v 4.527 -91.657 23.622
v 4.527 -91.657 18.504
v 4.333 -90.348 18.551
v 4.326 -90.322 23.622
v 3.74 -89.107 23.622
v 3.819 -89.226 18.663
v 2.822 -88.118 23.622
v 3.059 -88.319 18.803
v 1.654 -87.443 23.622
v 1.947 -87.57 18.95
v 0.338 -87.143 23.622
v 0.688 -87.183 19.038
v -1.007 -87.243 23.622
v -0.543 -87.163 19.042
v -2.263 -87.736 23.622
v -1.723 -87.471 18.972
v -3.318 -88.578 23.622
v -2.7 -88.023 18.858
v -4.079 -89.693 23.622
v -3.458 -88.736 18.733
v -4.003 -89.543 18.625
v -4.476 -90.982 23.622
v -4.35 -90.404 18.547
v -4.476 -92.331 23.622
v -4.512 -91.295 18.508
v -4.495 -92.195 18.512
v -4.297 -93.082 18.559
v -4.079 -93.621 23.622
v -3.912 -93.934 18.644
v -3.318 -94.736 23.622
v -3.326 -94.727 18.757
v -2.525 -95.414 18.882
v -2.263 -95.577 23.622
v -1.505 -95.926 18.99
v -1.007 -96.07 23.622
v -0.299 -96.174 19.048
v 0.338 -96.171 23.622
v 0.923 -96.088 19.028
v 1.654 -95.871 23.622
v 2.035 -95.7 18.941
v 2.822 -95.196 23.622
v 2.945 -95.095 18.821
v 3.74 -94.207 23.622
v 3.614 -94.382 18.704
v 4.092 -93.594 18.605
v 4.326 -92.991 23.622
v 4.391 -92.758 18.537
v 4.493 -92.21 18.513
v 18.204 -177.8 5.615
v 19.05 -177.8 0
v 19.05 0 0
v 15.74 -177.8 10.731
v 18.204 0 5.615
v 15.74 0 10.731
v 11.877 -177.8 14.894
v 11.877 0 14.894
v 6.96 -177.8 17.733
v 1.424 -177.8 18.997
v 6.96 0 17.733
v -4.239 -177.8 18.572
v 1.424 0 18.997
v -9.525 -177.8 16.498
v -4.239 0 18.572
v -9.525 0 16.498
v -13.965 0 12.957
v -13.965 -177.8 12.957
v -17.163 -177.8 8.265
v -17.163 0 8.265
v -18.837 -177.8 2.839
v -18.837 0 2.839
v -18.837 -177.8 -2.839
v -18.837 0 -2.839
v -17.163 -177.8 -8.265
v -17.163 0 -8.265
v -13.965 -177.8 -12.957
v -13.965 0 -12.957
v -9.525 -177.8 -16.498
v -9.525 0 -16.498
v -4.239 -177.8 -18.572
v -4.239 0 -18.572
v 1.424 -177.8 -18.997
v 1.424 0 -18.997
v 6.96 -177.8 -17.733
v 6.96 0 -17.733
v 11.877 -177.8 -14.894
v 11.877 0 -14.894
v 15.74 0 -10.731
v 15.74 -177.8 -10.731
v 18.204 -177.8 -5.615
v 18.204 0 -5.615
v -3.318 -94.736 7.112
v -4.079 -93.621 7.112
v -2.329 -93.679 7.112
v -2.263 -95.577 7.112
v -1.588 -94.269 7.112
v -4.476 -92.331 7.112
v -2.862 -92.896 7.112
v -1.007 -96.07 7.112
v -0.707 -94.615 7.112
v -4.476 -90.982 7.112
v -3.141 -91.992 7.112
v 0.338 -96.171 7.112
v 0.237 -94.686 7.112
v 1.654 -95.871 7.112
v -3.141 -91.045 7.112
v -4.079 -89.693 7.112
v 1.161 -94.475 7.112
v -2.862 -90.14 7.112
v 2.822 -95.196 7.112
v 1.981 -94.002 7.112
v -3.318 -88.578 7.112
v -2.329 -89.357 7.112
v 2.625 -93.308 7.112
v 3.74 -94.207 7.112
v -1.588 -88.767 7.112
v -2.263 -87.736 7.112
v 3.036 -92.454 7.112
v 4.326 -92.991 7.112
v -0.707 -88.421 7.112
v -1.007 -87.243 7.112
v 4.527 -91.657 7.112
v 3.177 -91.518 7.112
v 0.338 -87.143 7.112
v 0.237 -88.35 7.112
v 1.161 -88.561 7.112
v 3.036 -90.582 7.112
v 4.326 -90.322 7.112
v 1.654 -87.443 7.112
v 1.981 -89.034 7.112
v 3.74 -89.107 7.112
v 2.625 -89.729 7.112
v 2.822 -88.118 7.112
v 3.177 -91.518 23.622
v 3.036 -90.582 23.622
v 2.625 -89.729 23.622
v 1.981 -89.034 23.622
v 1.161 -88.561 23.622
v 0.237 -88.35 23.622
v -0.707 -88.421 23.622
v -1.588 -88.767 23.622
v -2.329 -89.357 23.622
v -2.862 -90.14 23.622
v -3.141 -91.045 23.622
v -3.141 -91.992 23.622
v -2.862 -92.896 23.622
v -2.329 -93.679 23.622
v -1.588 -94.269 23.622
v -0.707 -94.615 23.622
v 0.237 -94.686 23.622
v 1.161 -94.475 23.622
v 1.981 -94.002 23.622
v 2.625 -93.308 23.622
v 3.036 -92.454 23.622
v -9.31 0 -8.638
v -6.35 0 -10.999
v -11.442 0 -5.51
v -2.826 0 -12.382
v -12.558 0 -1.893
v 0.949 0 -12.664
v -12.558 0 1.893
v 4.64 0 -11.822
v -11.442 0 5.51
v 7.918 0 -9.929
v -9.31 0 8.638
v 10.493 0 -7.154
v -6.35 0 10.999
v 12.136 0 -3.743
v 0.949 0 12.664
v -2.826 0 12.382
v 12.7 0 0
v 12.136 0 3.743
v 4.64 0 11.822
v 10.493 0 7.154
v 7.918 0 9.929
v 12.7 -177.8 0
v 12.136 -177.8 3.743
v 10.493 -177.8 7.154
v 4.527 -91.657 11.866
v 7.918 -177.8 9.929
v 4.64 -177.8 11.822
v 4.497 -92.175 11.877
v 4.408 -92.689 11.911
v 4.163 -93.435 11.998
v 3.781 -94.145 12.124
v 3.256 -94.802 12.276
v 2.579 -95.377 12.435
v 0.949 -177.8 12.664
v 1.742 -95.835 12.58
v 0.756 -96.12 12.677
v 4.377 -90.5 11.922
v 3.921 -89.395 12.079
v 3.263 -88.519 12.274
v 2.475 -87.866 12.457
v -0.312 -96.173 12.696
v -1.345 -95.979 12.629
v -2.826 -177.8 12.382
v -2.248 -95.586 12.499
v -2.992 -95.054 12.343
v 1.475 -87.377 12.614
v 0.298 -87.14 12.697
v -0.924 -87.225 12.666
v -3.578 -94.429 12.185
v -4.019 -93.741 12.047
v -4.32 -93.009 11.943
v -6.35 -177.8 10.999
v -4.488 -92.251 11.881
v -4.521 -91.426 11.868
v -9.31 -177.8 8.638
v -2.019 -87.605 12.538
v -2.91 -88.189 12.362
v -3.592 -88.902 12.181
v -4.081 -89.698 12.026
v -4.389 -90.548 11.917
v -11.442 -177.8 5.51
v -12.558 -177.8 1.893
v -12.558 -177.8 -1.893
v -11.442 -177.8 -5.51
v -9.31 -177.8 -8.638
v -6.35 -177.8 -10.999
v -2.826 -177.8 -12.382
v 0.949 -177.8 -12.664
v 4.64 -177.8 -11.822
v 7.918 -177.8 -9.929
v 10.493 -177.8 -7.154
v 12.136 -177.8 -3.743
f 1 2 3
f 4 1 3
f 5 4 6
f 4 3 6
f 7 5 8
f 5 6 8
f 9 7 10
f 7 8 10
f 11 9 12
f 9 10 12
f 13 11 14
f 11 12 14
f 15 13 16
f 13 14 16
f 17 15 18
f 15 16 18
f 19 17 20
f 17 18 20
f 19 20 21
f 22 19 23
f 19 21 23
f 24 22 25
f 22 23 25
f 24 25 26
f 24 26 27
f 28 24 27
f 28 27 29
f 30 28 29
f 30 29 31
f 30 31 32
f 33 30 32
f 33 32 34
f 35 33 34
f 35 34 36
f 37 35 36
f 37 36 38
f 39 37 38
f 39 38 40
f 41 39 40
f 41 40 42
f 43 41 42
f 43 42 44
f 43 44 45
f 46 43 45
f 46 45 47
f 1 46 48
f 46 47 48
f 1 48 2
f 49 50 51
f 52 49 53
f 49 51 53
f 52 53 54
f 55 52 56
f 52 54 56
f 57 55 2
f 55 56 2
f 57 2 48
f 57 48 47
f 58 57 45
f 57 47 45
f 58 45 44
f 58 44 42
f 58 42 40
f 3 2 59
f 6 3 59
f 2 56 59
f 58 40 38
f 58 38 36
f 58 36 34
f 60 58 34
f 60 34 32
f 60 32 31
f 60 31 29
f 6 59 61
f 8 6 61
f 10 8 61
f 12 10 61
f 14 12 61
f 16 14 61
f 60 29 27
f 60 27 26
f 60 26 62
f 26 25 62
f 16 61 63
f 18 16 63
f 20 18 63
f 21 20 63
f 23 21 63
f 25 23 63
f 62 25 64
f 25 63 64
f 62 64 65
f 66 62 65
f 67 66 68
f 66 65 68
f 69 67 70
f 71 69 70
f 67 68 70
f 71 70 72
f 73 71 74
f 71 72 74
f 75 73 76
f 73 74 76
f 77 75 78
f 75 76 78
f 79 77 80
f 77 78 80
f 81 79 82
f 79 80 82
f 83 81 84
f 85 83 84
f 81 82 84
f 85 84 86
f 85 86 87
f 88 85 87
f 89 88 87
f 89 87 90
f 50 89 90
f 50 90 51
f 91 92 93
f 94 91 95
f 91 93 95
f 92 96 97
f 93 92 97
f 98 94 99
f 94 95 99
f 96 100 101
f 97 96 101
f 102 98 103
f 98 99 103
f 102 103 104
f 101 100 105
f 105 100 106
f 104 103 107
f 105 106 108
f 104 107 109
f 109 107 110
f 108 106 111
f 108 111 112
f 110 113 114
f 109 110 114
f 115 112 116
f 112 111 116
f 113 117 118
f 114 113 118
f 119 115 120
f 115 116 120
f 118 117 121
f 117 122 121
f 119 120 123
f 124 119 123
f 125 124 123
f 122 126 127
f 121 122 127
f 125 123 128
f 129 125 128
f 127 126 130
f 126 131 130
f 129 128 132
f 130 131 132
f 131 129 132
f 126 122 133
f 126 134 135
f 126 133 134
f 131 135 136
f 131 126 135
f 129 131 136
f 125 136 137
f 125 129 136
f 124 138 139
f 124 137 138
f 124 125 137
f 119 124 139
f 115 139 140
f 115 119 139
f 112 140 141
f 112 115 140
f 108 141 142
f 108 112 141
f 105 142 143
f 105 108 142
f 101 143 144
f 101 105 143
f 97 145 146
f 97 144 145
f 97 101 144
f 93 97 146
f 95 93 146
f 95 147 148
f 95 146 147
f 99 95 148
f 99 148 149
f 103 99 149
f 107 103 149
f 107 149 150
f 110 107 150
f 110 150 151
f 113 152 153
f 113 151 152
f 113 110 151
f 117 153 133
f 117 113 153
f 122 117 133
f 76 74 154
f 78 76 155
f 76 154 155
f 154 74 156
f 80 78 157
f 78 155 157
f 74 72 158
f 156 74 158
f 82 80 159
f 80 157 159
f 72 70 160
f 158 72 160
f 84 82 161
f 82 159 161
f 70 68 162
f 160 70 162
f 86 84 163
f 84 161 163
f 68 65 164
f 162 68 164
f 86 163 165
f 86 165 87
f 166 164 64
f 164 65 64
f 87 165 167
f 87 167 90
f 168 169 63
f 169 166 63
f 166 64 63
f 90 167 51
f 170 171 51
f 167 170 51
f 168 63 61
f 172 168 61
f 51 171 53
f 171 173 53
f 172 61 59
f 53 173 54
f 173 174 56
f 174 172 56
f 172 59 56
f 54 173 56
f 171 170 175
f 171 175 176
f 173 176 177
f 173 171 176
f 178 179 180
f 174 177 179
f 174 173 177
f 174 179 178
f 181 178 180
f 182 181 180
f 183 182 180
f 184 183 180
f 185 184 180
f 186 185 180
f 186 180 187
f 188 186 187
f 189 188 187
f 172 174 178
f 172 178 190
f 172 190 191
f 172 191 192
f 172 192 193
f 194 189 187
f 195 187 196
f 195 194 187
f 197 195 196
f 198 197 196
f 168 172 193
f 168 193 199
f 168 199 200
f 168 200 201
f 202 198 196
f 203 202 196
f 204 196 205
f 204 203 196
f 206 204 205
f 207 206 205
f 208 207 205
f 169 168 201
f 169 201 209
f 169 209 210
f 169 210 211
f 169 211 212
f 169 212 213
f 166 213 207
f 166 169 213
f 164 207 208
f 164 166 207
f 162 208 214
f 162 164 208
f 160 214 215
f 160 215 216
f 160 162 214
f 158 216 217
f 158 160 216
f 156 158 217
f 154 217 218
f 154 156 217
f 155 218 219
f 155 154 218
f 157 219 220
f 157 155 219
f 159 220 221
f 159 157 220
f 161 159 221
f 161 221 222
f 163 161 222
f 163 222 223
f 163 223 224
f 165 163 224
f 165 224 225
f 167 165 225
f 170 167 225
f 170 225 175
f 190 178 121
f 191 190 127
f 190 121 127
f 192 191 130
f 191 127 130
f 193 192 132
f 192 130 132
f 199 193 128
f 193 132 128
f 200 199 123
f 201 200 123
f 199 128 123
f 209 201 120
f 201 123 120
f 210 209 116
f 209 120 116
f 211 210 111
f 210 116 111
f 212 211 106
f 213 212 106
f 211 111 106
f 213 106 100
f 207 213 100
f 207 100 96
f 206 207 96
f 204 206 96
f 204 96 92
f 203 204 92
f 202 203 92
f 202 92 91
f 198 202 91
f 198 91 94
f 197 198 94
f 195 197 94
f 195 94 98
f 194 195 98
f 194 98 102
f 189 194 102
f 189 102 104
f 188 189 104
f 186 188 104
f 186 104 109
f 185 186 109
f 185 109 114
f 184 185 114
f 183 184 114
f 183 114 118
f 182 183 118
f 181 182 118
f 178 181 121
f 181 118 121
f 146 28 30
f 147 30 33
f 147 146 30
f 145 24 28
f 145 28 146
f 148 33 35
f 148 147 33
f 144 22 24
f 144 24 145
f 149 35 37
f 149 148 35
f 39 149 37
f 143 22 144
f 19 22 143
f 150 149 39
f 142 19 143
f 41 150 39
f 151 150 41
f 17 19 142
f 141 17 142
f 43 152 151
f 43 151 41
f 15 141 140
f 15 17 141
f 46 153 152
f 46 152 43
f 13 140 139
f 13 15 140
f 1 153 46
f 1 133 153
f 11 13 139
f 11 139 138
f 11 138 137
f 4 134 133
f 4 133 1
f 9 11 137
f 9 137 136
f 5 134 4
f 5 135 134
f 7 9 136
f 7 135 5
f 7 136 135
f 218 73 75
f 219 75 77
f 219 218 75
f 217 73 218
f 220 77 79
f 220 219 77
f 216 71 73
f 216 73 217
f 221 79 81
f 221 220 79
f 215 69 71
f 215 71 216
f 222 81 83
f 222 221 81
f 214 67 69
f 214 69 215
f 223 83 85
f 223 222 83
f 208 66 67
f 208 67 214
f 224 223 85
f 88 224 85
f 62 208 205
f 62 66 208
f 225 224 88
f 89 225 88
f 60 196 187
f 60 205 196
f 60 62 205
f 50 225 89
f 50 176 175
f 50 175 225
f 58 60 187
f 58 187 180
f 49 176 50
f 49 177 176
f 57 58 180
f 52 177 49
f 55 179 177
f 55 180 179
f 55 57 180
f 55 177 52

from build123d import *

# Parameters (mm, degrees)
F0_R     = 19.05
F1_DEPTH = 177.8
F2_R     = 12.7
F3_DEPTH = 177.8
F5_START = 7.112
F4_R     = 4.5268076309
F5_DEPTH = 16.51
F7_START = 6.604
F6_R     = 3.1768025879
F7_DEPTH = 17.78


with BuildPart() as f1:
    # F0 (on Front) → F1 (new body)
    with BuildSketch(Plane.XZ):
        Circle(F0_R)
    extrude(amount=F1_DEPTH)

    # F2 (on Front) → F3 (cut)
    with BuildSketch(Plane.XZ):
        Circle(F2_R)
    extrude(amount=F3_DEPTH, mode=Mode.SUBTRACT)

    # F4 (on Top) → F5 (join)
    with BuildSketch(Plane.XY.offset(F5_START)):
        with Locations((0, -91.6567370296)):
            Circle(F4_R)
    extrude(amount=F5_DEPTH)

    # F6 (on Top) → F7 (cut)
    with BuildSketch(Plane.XY.offset(F7_START)):
        with Locations((0, -91.5180891752)):
            Circle(F6_R)
    extrude(amount=F7_DEPTH, mode=Mode.SUBTRACT)


solid = f1.part
